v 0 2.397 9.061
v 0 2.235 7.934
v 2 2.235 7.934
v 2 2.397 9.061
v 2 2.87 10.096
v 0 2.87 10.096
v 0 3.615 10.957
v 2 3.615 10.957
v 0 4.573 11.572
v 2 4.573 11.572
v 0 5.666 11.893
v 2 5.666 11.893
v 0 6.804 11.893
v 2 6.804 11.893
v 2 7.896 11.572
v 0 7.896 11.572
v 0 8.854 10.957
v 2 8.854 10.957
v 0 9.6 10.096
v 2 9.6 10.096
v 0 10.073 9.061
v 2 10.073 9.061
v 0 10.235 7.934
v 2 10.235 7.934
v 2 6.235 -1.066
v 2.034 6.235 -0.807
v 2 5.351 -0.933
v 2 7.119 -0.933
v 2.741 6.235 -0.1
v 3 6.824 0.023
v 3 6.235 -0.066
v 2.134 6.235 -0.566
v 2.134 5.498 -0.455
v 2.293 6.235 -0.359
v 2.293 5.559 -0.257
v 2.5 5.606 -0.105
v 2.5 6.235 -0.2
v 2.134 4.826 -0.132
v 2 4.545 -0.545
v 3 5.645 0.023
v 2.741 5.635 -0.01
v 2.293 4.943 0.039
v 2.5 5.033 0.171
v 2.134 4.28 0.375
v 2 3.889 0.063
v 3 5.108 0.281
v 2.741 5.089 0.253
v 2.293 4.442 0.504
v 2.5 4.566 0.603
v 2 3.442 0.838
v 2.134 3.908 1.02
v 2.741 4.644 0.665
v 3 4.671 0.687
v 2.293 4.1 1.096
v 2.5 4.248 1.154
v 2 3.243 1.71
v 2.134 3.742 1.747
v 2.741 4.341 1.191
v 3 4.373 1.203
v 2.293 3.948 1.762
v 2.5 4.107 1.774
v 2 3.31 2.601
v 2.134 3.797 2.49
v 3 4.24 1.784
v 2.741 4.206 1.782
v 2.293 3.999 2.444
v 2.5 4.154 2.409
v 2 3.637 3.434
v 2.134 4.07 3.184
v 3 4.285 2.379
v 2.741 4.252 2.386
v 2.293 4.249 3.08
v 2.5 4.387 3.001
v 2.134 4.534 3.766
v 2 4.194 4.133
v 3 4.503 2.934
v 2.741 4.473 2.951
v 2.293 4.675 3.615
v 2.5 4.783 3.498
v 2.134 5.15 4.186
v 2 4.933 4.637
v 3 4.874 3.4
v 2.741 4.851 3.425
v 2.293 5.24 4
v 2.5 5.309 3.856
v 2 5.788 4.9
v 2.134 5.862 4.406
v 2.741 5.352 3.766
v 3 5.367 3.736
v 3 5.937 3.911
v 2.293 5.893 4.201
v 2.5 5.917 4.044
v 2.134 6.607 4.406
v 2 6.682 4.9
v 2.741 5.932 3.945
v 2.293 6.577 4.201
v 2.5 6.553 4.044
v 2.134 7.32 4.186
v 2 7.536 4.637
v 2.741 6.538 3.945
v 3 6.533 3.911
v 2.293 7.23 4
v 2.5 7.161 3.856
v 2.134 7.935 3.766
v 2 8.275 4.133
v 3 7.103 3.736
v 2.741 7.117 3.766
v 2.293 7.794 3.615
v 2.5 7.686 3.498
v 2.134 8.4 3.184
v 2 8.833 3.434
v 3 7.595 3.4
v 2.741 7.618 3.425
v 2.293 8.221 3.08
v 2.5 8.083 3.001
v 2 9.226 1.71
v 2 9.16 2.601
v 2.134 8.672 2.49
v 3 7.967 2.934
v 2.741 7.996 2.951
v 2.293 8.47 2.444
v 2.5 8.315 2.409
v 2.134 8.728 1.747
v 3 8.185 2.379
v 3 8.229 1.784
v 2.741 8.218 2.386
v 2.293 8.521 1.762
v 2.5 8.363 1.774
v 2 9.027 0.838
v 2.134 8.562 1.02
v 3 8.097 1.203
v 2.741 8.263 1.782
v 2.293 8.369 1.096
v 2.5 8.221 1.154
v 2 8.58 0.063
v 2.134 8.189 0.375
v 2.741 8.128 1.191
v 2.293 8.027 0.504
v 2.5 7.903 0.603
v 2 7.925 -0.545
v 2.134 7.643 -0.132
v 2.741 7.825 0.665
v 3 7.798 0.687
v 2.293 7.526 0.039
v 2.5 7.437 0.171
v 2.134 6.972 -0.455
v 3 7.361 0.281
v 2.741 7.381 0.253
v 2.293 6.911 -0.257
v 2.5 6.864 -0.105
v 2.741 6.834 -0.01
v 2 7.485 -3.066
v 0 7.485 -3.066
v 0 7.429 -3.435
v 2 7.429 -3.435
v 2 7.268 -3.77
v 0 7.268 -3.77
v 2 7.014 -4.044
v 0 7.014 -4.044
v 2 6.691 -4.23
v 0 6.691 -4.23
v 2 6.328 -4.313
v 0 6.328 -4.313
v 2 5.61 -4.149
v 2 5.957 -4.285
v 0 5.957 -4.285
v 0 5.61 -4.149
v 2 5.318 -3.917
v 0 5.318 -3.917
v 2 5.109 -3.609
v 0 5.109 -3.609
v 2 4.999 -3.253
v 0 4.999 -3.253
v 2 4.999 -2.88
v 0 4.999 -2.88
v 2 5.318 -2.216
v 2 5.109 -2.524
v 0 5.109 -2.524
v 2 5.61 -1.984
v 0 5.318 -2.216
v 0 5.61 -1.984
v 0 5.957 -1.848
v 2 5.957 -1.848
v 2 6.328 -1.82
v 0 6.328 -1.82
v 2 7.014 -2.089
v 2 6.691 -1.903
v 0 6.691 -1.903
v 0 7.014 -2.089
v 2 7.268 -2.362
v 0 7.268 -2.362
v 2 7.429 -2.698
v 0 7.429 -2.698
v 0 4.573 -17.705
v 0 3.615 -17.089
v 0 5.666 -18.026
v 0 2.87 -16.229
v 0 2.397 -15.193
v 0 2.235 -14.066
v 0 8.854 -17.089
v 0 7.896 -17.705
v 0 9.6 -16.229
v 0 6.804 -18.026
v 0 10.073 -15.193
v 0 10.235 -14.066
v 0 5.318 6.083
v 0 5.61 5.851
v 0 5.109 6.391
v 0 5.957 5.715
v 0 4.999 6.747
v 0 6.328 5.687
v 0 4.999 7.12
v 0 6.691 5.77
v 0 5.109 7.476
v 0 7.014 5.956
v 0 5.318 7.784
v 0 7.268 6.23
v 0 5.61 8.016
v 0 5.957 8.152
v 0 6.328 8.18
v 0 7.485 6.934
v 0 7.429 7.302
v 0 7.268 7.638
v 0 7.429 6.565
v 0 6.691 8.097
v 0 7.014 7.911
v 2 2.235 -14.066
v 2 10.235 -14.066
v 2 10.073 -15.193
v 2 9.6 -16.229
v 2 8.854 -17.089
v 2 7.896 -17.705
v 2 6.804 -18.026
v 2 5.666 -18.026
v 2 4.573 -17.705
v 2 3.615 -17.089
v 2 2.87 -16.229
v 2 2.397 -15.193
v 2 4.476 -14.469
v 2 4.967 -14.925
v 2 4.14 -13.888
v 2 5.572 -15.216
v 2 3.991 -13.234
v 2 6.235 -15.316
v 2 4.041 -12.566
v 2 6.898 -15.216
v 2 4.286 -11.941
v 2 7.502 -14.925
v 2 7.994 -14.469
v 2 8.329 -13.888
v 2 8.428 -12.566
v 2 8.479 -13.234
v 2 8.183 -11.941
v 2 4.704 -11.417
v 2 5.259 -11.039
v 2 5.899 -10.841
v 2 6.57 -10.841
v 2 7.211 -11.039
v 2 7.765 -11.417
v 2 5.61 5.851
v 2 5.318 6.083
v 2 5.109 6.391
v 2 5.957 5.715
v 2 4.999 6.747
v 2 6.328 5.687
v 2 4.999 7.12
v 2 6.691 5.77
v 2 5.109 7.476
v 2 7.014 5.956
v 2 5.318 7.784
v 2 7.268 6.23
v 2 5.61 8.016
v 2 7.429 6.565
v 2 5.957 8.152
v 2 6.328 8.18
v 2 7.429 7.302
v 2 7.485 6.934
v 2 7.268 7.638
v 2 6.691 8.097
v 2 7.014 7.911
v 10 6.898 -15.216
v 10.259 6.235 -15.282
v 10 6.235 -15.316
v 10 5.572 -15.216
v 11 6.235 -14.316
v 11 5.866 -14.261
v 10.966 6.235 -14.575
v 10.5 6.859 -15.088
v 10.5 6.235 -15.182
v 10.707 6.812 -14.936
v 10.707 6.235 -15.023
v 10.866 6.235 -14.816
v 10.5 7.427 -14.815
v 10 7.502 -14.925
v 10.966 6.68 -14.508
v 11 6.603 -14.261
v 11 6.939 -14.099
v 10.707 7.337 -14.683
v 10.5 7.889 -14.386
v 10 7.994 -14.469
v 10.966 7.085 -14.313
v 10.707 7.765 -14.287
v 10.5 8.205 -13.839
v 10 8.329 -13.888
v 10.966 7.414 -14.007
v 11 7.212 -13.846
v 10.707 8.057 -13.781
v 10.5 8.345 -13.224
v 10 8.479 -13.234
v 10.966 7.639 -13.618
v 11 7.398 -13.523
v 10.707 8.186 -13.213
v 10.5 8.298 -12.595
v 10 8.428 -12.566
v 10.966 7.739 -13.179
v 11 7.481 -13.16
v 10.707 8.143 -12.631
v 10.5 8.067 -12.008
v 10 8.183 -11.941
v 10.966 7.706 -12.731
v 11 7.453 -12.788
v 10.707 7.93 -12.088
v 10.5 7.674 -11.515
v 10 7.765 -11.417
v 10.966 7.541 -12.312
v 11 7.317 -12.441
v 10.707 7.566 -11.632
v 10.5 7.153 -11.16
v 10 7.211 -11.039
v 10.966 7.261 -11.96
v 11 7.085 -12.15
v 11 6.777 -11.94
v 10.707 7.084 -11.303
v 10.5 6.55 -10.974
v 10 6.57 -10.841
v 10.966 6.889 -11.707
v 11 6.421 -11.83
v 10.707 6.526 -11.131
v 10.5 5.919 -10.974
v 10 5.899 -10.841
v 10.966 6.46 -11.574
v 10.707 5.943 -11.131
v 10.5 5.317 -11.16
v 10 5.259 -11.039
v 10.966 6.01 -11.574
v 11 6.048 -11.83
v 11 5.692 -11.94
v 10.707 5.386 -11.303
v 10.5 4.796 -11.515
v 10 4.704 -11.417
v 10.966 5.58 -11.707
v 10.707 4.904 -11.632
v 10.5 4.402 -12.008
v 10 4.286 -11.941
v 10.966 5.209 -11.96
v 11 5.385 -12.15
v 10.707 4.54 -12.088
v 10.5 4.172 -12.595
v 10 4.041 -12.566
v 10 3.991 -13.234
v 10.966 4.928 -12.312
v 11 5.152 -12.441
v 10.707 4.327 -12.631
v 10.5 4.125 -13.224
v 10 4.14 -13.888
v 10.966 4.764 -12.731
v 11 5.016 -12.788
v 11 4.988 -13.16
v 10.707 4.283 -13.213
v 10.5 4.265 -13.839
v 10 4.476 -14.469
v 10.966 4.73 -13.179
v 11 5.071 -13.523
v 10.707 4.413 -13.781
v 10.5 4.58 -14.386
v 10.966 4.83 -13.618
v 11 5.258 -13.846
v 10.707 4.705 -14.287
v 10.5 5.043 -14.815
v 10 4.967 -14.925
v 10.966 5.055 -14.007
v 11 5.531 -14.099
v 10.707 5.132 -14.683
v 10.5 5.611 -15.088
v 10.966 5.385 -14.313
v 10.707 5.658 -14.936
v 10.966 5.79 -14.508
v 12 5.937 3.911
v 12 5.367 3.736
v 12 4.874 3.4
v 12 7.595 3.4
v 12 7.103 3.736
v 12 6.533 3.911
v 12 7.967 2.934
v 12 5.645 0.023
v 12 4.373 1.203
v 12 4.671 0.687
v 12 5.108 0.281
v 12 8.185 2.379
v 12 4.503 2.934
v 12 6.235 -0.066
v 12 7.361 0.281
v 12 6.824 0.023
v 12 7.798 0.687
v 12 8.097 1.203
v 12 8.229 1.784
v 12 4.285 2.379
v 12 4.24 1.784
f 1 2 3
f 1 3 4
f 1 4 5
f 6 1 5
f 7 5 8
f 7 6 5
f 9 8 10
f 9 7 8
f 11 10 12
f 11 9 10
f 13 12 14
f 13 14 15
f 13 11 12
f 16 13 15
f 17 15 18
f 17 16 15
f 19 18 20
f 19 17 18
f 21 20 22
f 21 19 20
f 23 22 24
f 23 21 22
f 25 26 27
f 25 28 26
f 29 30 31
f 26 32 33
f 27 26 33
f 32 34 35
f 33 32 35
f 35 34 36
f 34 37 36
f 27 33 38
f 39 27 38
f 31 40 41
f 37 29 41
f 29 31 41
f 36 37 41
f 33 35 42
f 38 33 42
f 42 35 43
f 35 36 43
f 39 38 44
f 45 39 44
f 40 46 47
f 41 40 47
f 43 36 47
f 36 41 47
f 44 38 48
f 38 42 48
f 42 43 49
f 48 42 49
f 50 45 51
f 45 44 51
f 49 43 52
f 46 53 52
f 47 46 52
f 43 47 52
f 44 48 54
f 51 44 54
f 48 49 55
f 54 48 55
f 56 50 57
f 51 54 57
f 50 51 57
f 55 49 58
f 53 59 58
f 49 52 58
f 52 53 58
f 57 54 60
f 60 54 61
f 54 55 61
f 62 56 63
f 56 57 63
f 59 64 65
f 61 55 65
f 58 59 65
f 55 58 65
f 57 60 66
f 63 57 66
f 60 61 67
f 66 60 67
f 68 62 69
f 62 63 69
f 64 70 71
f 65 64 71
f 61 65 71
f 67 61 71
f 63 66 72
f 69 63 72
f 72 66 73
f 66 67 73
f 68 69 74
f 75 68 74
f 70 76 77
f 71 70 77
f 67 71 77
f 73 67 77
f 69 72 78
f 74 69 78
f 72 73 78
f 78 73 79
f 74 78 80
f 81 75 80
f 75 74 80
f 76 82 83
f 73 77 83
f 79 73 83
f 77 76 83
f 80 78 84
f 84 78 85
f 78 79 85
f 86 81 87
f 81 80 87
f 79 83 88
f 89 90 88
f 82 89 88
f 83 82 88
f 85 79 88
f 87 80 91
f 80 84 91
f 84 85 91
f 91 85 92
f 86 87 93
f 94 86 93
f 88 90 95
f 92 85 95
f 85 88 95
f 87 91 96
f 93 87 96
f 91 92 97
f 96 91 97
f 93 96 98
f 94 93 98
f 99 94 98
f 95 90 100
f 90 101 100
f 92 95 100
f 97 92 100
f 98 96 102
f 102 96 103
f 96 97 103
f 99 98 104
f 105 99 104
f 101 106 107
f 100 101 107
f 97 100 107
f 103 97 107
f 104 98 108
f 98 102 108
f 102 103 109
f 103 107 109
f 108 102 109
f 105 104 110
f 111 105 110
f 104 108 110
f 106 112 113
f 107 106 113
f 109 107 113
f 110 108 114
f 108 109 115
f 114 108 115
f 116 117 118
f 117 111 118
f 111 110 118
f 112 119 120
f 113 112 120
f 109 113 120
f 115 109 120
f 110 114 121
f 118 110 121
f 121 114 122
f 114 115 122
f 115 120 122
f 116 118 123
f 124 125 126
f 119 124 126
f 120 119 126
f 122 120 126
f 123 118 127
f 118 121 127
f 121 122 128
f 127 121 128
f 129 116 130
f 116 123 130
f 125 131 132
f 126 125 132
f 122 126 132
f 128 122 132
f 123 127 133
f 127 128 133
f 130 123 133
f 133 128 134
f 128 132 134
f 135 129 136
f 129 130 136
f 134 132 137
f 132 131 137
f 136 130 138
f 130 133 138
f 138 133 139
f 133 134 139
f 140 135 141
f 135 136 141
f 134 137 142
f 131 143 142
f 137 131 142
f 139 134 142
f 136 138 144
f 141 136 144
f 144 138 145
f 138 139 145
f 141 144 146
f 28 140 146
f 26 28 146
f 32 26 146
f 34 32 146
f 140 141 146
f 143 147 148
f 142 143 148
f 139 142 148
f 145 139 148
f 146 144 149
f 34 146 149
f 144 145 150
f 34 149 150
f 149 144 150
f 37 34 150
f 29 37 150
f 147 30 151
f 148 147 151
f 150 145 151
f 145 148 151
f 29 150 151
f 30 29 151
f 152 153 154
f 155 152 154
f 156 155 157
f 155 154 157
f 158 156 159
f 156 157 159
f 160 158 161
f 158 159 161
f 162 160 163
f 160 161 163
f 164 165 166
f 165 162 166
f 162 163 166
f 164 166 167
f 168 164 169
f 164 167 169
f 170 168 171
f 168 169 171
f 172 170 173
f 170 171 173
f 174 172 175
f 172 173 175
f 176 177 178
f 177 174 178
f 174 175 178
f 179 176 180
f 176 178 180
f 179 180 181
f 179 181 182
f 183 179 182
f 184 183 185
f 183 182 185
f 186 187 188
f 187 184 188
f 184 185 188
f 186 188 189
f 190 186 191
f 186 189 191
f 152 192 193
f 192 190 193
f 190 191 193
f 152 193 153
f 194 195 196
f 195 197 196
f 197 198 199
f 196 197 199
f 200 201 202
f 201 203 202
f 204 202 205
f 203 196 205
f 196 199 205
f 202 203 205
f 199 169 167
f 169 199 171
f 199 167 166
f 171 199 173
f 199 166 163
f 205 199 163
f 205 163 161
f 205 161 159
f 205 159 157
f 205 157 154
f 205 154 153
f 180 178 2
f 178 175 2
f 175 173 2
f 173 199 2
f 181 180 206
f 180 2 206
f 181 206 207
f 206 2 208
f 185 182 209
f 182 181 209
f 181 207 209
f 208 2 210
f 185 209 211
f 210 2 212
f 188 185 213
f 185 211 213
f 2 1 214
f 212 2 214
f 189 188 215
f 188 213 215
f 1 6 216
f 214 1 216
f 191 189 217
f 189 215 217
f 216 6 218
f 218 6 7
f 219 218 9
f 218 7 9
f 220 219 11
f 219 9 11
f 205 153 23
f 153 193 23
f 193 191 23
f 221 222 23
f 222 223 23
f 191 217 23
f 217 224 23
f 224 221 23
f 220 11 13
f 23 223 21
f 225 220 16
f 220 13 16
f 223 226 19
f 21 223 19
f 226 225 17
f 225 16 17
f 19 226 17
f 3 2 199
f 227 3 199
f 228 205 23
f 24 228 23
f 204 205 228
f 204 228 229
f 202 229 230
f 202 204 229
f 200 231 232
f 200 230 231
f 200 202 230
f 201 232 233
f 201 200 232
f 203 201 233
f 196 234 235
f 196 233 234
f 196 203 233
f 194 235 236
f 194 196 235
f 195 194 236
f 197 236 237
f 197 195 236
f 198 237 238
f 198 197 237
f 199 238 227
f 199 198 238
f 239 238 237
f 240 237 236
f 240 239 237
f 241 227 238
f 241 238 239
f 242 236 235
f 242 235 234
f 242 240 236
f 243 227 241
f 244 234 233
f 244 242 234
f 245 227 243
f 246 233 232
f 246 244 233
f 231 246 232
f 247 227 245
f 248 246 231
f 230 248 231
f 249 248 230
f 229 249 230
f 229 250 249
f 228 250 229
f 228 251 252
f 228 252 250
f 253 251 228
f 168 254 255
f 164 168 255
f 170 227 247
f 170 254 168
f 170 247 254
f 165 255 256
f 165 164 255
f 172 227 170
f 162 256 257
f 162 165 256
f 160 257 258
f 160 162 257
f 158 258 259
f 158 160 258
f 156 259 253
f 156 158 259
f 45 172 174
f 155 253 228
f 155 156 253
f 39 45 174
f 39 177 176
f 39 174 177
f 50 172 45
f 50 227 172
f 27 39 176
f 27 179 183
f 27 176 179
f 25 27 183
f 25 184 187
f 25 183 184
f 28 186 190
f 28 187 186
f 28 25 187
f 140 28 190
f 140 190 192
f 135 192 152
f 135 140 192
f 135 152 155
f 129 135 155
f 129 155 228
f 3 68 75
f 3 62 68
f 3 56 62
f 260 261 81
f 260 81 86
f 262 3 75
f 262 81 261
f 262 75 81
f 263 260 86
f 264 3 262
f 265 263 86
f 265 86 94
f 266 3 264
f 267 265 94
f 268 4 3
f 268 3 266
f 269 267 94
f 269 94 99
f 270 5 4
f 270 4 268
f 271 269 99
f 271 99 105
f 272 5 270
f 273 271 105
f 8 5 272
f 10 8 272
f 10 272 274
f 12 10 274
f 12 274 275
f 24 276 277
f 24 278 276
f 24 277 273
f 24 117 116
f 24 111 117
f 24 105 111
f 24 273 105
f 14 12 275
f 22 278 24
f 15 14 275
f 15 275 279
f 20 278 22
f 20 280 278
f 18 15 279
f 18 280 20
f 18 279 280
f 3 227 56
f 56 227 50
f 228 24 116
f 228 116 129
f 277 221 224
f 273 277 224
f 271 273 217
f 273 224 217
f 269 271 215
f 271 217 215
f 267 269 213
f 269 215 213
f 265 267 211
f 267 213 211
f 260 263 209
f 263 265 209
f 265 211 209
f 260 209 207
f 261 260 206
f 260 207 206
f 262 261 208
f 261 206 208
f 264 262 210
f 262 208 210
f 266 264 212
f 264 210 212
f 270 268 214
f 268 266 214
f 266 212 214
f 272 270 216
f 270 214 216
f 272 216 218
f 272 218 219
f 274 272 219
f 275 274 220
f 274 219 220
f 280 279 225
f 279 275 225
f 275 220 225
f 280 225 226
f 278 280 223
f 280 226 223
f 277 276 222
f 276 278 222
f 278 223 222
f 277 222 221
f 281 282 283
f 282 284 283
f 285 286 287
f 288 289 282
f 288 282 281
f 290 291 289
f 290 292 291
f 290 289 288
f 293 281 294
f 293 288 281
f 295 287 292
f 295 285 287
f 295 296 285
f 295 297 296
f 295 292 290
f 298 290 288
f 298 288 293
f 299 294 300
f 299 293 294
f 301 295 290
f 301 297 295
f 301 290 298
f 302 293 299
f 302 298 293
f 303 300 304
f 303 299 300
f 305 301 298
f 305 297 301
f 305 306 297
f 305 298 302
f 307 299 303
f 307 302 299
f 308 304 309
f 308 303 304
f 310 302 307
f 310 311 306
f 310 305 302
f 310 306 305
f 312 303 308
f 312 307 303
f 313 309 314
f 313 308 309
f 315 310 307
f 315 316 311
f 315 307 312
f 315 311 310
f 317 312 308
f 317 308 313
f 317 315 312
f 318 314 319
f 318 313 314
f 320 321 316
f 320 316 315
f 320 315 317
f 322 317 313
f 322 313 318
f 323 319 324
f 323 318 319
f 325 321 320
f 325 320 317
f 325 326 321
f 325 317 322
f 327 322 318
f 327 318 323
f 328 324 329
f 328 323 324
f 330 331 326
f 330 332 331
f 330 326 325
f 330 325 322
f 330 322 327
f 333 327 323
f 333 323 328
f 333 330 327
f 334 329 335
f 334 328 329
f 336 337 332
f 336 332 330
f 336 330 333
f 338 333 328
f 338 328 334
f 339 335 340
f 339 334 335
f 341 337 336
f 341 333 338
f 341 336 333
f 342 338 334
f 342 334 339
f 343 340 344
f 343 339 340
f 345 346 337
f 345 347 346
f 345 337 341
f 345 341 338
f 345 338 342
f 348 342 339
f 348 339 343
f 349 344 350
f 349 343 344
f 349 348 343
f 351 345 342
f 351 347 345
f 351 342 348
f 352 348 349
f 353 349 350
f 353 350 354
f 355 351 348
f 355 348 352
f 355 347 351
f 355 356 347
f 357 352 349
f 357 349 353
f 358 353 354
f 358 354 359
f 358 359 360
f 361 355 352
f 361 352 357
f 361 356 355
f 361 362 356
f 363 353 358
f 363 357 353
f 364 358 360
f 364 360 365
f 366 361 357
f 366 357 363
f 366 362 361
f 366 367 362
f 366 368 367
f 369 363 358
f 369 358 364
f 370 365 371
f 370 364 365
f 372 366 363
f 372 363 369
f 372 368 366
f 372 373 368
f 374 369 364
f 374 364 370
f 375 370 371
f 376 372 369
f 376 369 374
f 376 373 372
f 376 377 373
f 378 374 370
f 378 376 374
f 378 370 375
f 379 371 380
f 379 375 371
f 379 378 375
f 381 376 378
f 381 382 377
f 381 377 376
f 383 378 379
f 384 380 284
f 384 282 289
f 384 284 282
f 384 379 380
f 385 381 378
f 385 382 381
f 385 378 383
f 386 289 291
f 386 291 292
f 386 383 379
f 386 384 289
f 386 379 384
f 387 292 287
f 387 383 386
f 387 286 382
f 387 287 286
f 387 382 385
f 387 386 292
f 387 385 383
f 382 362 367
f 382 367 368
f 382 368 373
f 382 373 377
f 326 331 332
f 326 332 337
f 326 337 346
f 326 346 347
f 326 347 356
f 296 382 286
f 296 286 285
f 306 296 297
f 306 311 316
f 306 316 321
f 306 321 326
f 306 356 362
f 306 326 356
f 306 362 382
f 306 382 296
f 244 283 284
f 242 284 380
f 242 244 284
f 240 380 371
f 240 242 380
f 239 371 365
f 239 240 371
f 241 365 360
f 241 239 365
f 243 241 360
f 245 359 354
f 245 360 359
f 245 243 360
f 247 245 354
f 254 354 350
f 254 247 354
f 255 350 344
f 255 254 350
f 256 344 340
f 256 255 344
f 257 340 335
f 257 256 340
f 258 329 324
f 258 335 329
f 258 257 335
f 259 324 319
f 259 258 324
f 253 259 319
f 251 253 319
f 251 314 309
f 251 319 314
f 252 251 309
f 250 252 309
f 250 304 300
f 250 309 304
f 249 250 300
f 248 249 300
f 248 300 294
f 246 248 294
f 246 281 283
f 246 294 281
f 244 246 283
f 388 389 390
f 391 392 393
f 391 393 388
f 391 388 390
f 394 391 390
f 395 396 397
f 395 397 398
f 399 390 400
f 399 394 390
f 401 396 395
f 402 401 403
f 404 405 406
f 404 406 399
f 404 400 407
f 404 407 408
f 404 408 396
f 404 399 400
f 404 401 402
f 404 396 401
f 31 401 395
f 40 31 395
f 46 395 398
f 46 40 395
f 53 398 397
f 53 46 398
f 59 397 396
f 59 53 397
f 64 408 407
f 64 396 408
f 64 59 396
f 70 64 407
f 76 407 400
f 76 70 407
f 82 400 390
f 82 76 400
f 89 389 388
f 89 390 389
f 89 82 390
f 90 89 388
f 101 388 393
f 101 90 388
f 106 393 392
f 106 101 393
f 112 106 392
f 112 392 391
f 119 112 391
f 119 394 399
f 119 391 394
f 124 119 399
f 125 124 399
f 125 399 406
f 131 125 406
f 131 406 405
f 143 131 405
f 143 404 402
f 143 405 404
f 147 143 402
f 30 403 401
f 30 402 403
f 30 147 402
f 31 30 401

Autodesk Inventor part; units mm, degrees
ref_plane "YZ Plane" through (0, 0, 0) normal (1, 0, 0) x (0, 1, 0)
ref_plane "XZ Plane" through (0, 0, 0) normal (0, 1, 0) x (-1, 0, 0)
ref_plane "XY Plane" through (0, 0, 0) normal (0, 0, 1) x (1, 0, 0)
sketch "Sketch1" plane through (0, 0, 0) normal (1, 0, 0) x (0, 1, 0)
  line L0 (6.2348, 11.9337) -> (6.2348, 11.9337)
  line L1 (2.2348, 7.9337) -> (2.2348, -14.0663)
  line L2 (6.2348, -18.0663) -> (6.2348, -18.0663)
  line L3 (10.2348, -14.0663) -> (10.2348, 7.9337)
  circle A0 centre (6.2348, 6.9337) radius 1.25
  circle A1 centre (6.2348, -3.0663) radius 1.25
  circle A2 centre (6.2348, -13.0663) radius 2.25
  arc A3 (6.2348, -18.0663) -> (10.2348, -14.0663) centre (6.2348, -14.0663) ccw
  arc A4 (2.2348, -14.0663) -> (6.2348, -18.0663) centre (6.2348, -14.0663) ccw
  arc A5 (6.2348, 11.9337) -> (2.2348, 7.9337) centre (6.2348, 7.9337) ccw
  arc A6 (10.2348, 7.9337) -> (6.2348, 11.9337) centre (6.2348, 7.9337) ccw
  point P0 (0, 0)
  point P1 (10.2348, 11.9337)
  point P2 (2.2348, 11.9337)
  point P3 (10.2348, -18.0663)
  dimension "d0" = 30
  dimension "d1" = 8
  dimension "d2" = 10
  dimension "d3" = 20
  dimension "d4" = 5
  dimension "d5" = 4.5
  dimension "d6" = 2.5
  dimension "d7" = 2.5
  dimension "d8" = 4
extrude "Extrusion1" add sketch "Sketch1" along normal blind 2
sketch "Sketch2" plane through (2, 0, 0) normal (1, 0, 0) x (0, 0, -1)
  circle A0 centre (-1.9337, 6.2348) radius 2
  circle A1 centre (3.0663, 6.2348) radius 1.25 projected
  point P0 (0, 0)
  dimension "d11" = 4
  dimension "d12" = 5
extrude "Extrusion2" add sketch "Sketch2" along normal blind 10 contours A0
fillet "Fillet1" radius 1 1 edges at (2, 6.2348, 3.9337)
sketch "Sketch4" plane through (2, 0, 0) normal (1, 0, 0) x (0, 0, -1)
  circle A0 centre (13.0663, 6.2348) radius 2.25 projected
  circle A1 centre (13.0663, 6.2348) radius 2.4
  point P0 (0, 0)
  dimension "d25" = 4.8
extrude "Extrusion4" add sketch "Sketch4" along normal blind 9 and the other way blind 2 contours A0
fillet "Fillet2" radius 1 1 edges at (11, 6.2348, -10.8163)
properties part number "cube_Holder"
